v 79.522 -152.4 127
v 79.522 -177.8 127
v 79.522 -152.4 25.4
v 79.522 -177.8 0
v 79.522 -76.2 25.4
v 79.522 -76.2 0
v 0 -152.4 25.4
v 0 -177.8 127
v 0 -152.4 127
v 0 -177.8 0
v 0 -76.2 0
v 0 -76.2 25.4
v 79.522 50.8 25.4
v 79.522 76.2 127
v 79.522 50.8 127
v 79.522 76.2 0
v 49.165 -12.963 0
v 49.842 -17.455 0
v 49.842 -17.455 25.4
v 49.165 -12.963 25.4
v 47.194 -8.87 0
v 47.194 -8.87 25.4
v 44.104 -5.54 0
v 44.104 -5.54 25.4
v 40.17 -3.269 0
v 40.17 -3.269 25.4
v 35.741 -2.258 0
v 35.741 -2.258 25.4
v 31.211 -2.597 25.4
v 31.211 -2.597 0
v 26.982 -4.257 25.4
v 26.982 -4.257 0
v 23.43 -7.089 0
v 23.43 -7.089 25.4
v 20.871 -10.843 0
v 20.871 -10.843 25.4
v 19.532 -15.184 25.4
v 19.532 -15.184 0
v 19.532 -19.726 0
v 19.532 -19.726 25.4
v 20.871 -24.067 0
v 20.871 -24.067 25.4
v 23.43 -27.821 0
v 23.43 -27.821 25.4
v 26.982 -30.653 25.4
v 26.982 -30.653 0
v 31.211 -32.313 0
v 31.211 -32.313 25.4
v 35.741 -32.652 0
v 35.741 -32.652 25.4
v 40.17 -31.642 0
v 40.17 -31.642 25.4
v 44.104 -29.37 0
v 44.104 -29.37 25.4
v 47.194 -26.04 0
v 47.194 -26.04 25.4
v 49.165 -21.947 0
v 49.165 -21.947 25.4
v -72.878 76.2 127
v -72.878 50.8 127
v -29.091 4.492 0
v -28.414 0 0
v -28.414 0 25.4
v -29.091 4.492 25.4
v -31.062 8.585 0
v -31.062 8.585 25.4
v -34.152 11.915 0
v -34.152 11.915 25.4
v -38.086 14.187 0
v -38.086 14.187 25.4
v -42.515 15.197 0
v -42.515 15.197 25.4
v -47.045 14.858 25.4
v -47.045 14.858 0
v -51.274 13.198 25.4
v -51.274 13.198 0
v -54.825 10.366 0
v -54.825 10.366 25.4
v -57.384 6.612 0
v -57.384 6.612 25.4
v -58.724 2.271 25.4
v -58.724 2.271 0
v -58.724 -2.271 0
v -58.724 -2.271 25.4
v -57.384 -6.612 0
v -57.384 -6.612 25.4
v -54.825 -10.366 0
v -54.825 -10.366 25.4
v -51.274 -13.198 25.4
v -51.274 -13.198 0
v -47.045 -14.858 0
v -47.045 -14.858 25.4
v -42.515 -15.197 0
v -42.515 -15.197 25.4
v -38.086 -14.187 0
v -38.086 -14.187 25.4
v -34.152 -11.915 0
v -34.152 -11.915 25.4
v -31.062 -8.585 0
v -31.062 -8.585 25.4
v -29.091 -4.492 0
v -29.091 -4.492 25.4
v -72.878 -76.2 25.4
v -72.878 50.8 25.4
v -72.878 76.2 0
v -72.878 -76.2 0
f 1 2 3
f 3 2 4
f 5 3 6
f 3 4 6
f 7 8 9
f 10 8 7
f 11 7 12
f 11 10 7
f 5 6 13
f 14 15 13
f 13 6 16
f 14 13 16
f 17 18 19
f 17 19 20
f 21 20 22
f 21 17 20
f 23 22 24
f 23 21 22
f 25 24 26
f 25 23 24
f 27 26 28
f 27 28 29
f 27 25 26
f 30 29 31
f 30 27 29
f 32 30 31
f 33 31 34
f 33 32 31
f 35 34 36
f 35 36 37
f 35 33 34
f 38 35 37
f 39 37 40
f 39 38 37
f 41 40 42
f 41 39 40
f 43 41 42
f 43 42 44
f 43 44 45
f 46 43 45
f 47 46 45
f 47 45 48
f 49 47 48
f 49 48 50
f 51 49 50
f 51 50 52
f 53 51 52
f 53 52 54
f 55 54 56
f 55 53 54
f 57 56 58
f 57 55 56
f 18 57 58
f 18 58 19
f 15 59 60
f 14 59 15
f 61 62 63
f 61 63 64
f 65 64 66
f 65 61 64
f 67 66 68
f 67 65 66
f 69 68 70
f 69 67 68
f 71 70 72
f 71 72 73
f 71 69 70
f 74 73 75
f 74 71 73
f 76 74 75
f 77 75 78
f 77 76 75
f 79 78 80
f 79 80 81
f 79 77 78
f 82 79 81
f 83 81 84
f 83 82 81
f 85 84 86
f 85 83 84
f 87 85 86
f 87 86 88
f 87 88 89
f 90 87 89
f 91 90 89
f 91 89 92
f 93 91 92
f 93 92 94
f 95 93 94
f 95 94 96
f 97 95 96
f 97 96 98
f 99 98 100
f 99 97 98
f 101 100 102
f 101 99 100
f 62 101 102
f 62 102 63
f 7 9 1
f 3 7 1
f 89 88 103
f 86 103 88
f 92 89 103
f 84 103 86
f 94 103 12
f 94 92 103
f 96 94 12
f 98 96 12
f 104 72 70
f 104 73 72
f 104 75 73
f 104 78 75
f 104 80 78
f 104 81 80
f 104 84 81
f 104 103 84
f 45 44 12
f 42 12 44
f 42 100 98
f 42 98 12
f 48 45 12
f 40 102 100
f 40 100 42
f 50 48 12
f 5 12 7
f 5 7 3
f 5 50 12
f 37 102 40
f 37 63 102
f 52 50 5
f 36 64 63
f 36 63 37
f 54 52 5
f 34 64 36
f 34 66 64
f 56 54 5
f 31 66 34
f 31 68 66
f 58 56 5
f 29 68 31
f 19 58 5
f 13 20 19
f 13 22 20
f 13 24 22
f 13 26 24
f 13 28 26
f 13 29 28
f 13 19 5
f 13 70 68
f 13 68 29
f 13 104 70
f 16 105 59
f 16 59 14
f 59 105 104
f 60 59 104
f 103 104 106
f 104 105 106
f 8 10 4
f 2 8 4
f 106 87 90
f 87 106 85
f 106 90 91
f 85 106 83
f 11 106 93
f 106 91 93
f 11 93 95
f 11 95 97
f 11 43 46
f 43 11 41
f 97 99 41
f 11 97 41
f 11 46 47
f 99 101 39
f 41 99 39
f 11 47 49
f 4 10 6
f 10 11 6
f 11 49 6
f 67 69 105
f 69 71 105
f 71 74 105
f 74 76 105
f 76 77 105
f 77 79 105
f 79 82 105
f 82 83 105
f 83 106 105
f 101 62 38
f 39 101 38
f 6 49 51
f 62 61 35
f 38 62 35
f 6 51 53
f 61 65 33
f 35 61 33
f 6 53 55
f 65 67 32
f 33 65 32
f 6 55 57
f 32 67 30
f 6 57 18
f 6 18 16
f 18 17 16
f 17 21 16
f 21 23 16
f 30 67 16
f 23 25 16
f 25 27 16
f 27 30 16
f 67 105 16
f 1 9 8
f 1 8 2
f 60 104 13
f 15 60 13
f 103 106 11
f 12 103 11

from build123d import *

# Parameters (mm, degrees)
F0_W     = 152.4
F0_H     = 25.4
F1_DEPTH = 127
F0_R     = 15.24
F0_W_2   = 79.522247
F0_H_2   = 76.2
F2_DEPTH = 25.4
F3_DEPTH = 127


with BuildPart() as f1:
    # F0 (on Top) → F1 (new body)
    with BuildSketch(Plane.XY):
        with Locations((3.322247, 63.5)):
            Rectangle(F0_W, F0_H)
    extrude(amount=F1_DEPTH)

    # F0 (on Top) → F2 (join)
    with BuildSketch(Plane.XY):
        Polygon((79.522247, 50.8), (-72.877753, 50.8), (-72.877753, -76.2), (0, -76.2), (79.522247, -76.2), align=None)
        with Locations((-43.653723, 0)):
            Circle(F0_R, mode=Mode.SUBTRACT)
        with Locations((34.601994, -17.455092)):
            Circle(F0_R, mode=Mode.SUBTRACT)
        with Locations((39.761123, -114.3)):
            Rectangle(F0_W_2, F0_H_2)
    extrude(amount=F2_DEPTH)

    # F0 (on Top) → F3 (join)
    with BuildSketch(Plane.XY):
        with Locations((39.761123, -165.1)):
            Rectangle(F0_W_2, F0_H)
    extrude(amount=F3_DEPTH)


solid = f1.part
